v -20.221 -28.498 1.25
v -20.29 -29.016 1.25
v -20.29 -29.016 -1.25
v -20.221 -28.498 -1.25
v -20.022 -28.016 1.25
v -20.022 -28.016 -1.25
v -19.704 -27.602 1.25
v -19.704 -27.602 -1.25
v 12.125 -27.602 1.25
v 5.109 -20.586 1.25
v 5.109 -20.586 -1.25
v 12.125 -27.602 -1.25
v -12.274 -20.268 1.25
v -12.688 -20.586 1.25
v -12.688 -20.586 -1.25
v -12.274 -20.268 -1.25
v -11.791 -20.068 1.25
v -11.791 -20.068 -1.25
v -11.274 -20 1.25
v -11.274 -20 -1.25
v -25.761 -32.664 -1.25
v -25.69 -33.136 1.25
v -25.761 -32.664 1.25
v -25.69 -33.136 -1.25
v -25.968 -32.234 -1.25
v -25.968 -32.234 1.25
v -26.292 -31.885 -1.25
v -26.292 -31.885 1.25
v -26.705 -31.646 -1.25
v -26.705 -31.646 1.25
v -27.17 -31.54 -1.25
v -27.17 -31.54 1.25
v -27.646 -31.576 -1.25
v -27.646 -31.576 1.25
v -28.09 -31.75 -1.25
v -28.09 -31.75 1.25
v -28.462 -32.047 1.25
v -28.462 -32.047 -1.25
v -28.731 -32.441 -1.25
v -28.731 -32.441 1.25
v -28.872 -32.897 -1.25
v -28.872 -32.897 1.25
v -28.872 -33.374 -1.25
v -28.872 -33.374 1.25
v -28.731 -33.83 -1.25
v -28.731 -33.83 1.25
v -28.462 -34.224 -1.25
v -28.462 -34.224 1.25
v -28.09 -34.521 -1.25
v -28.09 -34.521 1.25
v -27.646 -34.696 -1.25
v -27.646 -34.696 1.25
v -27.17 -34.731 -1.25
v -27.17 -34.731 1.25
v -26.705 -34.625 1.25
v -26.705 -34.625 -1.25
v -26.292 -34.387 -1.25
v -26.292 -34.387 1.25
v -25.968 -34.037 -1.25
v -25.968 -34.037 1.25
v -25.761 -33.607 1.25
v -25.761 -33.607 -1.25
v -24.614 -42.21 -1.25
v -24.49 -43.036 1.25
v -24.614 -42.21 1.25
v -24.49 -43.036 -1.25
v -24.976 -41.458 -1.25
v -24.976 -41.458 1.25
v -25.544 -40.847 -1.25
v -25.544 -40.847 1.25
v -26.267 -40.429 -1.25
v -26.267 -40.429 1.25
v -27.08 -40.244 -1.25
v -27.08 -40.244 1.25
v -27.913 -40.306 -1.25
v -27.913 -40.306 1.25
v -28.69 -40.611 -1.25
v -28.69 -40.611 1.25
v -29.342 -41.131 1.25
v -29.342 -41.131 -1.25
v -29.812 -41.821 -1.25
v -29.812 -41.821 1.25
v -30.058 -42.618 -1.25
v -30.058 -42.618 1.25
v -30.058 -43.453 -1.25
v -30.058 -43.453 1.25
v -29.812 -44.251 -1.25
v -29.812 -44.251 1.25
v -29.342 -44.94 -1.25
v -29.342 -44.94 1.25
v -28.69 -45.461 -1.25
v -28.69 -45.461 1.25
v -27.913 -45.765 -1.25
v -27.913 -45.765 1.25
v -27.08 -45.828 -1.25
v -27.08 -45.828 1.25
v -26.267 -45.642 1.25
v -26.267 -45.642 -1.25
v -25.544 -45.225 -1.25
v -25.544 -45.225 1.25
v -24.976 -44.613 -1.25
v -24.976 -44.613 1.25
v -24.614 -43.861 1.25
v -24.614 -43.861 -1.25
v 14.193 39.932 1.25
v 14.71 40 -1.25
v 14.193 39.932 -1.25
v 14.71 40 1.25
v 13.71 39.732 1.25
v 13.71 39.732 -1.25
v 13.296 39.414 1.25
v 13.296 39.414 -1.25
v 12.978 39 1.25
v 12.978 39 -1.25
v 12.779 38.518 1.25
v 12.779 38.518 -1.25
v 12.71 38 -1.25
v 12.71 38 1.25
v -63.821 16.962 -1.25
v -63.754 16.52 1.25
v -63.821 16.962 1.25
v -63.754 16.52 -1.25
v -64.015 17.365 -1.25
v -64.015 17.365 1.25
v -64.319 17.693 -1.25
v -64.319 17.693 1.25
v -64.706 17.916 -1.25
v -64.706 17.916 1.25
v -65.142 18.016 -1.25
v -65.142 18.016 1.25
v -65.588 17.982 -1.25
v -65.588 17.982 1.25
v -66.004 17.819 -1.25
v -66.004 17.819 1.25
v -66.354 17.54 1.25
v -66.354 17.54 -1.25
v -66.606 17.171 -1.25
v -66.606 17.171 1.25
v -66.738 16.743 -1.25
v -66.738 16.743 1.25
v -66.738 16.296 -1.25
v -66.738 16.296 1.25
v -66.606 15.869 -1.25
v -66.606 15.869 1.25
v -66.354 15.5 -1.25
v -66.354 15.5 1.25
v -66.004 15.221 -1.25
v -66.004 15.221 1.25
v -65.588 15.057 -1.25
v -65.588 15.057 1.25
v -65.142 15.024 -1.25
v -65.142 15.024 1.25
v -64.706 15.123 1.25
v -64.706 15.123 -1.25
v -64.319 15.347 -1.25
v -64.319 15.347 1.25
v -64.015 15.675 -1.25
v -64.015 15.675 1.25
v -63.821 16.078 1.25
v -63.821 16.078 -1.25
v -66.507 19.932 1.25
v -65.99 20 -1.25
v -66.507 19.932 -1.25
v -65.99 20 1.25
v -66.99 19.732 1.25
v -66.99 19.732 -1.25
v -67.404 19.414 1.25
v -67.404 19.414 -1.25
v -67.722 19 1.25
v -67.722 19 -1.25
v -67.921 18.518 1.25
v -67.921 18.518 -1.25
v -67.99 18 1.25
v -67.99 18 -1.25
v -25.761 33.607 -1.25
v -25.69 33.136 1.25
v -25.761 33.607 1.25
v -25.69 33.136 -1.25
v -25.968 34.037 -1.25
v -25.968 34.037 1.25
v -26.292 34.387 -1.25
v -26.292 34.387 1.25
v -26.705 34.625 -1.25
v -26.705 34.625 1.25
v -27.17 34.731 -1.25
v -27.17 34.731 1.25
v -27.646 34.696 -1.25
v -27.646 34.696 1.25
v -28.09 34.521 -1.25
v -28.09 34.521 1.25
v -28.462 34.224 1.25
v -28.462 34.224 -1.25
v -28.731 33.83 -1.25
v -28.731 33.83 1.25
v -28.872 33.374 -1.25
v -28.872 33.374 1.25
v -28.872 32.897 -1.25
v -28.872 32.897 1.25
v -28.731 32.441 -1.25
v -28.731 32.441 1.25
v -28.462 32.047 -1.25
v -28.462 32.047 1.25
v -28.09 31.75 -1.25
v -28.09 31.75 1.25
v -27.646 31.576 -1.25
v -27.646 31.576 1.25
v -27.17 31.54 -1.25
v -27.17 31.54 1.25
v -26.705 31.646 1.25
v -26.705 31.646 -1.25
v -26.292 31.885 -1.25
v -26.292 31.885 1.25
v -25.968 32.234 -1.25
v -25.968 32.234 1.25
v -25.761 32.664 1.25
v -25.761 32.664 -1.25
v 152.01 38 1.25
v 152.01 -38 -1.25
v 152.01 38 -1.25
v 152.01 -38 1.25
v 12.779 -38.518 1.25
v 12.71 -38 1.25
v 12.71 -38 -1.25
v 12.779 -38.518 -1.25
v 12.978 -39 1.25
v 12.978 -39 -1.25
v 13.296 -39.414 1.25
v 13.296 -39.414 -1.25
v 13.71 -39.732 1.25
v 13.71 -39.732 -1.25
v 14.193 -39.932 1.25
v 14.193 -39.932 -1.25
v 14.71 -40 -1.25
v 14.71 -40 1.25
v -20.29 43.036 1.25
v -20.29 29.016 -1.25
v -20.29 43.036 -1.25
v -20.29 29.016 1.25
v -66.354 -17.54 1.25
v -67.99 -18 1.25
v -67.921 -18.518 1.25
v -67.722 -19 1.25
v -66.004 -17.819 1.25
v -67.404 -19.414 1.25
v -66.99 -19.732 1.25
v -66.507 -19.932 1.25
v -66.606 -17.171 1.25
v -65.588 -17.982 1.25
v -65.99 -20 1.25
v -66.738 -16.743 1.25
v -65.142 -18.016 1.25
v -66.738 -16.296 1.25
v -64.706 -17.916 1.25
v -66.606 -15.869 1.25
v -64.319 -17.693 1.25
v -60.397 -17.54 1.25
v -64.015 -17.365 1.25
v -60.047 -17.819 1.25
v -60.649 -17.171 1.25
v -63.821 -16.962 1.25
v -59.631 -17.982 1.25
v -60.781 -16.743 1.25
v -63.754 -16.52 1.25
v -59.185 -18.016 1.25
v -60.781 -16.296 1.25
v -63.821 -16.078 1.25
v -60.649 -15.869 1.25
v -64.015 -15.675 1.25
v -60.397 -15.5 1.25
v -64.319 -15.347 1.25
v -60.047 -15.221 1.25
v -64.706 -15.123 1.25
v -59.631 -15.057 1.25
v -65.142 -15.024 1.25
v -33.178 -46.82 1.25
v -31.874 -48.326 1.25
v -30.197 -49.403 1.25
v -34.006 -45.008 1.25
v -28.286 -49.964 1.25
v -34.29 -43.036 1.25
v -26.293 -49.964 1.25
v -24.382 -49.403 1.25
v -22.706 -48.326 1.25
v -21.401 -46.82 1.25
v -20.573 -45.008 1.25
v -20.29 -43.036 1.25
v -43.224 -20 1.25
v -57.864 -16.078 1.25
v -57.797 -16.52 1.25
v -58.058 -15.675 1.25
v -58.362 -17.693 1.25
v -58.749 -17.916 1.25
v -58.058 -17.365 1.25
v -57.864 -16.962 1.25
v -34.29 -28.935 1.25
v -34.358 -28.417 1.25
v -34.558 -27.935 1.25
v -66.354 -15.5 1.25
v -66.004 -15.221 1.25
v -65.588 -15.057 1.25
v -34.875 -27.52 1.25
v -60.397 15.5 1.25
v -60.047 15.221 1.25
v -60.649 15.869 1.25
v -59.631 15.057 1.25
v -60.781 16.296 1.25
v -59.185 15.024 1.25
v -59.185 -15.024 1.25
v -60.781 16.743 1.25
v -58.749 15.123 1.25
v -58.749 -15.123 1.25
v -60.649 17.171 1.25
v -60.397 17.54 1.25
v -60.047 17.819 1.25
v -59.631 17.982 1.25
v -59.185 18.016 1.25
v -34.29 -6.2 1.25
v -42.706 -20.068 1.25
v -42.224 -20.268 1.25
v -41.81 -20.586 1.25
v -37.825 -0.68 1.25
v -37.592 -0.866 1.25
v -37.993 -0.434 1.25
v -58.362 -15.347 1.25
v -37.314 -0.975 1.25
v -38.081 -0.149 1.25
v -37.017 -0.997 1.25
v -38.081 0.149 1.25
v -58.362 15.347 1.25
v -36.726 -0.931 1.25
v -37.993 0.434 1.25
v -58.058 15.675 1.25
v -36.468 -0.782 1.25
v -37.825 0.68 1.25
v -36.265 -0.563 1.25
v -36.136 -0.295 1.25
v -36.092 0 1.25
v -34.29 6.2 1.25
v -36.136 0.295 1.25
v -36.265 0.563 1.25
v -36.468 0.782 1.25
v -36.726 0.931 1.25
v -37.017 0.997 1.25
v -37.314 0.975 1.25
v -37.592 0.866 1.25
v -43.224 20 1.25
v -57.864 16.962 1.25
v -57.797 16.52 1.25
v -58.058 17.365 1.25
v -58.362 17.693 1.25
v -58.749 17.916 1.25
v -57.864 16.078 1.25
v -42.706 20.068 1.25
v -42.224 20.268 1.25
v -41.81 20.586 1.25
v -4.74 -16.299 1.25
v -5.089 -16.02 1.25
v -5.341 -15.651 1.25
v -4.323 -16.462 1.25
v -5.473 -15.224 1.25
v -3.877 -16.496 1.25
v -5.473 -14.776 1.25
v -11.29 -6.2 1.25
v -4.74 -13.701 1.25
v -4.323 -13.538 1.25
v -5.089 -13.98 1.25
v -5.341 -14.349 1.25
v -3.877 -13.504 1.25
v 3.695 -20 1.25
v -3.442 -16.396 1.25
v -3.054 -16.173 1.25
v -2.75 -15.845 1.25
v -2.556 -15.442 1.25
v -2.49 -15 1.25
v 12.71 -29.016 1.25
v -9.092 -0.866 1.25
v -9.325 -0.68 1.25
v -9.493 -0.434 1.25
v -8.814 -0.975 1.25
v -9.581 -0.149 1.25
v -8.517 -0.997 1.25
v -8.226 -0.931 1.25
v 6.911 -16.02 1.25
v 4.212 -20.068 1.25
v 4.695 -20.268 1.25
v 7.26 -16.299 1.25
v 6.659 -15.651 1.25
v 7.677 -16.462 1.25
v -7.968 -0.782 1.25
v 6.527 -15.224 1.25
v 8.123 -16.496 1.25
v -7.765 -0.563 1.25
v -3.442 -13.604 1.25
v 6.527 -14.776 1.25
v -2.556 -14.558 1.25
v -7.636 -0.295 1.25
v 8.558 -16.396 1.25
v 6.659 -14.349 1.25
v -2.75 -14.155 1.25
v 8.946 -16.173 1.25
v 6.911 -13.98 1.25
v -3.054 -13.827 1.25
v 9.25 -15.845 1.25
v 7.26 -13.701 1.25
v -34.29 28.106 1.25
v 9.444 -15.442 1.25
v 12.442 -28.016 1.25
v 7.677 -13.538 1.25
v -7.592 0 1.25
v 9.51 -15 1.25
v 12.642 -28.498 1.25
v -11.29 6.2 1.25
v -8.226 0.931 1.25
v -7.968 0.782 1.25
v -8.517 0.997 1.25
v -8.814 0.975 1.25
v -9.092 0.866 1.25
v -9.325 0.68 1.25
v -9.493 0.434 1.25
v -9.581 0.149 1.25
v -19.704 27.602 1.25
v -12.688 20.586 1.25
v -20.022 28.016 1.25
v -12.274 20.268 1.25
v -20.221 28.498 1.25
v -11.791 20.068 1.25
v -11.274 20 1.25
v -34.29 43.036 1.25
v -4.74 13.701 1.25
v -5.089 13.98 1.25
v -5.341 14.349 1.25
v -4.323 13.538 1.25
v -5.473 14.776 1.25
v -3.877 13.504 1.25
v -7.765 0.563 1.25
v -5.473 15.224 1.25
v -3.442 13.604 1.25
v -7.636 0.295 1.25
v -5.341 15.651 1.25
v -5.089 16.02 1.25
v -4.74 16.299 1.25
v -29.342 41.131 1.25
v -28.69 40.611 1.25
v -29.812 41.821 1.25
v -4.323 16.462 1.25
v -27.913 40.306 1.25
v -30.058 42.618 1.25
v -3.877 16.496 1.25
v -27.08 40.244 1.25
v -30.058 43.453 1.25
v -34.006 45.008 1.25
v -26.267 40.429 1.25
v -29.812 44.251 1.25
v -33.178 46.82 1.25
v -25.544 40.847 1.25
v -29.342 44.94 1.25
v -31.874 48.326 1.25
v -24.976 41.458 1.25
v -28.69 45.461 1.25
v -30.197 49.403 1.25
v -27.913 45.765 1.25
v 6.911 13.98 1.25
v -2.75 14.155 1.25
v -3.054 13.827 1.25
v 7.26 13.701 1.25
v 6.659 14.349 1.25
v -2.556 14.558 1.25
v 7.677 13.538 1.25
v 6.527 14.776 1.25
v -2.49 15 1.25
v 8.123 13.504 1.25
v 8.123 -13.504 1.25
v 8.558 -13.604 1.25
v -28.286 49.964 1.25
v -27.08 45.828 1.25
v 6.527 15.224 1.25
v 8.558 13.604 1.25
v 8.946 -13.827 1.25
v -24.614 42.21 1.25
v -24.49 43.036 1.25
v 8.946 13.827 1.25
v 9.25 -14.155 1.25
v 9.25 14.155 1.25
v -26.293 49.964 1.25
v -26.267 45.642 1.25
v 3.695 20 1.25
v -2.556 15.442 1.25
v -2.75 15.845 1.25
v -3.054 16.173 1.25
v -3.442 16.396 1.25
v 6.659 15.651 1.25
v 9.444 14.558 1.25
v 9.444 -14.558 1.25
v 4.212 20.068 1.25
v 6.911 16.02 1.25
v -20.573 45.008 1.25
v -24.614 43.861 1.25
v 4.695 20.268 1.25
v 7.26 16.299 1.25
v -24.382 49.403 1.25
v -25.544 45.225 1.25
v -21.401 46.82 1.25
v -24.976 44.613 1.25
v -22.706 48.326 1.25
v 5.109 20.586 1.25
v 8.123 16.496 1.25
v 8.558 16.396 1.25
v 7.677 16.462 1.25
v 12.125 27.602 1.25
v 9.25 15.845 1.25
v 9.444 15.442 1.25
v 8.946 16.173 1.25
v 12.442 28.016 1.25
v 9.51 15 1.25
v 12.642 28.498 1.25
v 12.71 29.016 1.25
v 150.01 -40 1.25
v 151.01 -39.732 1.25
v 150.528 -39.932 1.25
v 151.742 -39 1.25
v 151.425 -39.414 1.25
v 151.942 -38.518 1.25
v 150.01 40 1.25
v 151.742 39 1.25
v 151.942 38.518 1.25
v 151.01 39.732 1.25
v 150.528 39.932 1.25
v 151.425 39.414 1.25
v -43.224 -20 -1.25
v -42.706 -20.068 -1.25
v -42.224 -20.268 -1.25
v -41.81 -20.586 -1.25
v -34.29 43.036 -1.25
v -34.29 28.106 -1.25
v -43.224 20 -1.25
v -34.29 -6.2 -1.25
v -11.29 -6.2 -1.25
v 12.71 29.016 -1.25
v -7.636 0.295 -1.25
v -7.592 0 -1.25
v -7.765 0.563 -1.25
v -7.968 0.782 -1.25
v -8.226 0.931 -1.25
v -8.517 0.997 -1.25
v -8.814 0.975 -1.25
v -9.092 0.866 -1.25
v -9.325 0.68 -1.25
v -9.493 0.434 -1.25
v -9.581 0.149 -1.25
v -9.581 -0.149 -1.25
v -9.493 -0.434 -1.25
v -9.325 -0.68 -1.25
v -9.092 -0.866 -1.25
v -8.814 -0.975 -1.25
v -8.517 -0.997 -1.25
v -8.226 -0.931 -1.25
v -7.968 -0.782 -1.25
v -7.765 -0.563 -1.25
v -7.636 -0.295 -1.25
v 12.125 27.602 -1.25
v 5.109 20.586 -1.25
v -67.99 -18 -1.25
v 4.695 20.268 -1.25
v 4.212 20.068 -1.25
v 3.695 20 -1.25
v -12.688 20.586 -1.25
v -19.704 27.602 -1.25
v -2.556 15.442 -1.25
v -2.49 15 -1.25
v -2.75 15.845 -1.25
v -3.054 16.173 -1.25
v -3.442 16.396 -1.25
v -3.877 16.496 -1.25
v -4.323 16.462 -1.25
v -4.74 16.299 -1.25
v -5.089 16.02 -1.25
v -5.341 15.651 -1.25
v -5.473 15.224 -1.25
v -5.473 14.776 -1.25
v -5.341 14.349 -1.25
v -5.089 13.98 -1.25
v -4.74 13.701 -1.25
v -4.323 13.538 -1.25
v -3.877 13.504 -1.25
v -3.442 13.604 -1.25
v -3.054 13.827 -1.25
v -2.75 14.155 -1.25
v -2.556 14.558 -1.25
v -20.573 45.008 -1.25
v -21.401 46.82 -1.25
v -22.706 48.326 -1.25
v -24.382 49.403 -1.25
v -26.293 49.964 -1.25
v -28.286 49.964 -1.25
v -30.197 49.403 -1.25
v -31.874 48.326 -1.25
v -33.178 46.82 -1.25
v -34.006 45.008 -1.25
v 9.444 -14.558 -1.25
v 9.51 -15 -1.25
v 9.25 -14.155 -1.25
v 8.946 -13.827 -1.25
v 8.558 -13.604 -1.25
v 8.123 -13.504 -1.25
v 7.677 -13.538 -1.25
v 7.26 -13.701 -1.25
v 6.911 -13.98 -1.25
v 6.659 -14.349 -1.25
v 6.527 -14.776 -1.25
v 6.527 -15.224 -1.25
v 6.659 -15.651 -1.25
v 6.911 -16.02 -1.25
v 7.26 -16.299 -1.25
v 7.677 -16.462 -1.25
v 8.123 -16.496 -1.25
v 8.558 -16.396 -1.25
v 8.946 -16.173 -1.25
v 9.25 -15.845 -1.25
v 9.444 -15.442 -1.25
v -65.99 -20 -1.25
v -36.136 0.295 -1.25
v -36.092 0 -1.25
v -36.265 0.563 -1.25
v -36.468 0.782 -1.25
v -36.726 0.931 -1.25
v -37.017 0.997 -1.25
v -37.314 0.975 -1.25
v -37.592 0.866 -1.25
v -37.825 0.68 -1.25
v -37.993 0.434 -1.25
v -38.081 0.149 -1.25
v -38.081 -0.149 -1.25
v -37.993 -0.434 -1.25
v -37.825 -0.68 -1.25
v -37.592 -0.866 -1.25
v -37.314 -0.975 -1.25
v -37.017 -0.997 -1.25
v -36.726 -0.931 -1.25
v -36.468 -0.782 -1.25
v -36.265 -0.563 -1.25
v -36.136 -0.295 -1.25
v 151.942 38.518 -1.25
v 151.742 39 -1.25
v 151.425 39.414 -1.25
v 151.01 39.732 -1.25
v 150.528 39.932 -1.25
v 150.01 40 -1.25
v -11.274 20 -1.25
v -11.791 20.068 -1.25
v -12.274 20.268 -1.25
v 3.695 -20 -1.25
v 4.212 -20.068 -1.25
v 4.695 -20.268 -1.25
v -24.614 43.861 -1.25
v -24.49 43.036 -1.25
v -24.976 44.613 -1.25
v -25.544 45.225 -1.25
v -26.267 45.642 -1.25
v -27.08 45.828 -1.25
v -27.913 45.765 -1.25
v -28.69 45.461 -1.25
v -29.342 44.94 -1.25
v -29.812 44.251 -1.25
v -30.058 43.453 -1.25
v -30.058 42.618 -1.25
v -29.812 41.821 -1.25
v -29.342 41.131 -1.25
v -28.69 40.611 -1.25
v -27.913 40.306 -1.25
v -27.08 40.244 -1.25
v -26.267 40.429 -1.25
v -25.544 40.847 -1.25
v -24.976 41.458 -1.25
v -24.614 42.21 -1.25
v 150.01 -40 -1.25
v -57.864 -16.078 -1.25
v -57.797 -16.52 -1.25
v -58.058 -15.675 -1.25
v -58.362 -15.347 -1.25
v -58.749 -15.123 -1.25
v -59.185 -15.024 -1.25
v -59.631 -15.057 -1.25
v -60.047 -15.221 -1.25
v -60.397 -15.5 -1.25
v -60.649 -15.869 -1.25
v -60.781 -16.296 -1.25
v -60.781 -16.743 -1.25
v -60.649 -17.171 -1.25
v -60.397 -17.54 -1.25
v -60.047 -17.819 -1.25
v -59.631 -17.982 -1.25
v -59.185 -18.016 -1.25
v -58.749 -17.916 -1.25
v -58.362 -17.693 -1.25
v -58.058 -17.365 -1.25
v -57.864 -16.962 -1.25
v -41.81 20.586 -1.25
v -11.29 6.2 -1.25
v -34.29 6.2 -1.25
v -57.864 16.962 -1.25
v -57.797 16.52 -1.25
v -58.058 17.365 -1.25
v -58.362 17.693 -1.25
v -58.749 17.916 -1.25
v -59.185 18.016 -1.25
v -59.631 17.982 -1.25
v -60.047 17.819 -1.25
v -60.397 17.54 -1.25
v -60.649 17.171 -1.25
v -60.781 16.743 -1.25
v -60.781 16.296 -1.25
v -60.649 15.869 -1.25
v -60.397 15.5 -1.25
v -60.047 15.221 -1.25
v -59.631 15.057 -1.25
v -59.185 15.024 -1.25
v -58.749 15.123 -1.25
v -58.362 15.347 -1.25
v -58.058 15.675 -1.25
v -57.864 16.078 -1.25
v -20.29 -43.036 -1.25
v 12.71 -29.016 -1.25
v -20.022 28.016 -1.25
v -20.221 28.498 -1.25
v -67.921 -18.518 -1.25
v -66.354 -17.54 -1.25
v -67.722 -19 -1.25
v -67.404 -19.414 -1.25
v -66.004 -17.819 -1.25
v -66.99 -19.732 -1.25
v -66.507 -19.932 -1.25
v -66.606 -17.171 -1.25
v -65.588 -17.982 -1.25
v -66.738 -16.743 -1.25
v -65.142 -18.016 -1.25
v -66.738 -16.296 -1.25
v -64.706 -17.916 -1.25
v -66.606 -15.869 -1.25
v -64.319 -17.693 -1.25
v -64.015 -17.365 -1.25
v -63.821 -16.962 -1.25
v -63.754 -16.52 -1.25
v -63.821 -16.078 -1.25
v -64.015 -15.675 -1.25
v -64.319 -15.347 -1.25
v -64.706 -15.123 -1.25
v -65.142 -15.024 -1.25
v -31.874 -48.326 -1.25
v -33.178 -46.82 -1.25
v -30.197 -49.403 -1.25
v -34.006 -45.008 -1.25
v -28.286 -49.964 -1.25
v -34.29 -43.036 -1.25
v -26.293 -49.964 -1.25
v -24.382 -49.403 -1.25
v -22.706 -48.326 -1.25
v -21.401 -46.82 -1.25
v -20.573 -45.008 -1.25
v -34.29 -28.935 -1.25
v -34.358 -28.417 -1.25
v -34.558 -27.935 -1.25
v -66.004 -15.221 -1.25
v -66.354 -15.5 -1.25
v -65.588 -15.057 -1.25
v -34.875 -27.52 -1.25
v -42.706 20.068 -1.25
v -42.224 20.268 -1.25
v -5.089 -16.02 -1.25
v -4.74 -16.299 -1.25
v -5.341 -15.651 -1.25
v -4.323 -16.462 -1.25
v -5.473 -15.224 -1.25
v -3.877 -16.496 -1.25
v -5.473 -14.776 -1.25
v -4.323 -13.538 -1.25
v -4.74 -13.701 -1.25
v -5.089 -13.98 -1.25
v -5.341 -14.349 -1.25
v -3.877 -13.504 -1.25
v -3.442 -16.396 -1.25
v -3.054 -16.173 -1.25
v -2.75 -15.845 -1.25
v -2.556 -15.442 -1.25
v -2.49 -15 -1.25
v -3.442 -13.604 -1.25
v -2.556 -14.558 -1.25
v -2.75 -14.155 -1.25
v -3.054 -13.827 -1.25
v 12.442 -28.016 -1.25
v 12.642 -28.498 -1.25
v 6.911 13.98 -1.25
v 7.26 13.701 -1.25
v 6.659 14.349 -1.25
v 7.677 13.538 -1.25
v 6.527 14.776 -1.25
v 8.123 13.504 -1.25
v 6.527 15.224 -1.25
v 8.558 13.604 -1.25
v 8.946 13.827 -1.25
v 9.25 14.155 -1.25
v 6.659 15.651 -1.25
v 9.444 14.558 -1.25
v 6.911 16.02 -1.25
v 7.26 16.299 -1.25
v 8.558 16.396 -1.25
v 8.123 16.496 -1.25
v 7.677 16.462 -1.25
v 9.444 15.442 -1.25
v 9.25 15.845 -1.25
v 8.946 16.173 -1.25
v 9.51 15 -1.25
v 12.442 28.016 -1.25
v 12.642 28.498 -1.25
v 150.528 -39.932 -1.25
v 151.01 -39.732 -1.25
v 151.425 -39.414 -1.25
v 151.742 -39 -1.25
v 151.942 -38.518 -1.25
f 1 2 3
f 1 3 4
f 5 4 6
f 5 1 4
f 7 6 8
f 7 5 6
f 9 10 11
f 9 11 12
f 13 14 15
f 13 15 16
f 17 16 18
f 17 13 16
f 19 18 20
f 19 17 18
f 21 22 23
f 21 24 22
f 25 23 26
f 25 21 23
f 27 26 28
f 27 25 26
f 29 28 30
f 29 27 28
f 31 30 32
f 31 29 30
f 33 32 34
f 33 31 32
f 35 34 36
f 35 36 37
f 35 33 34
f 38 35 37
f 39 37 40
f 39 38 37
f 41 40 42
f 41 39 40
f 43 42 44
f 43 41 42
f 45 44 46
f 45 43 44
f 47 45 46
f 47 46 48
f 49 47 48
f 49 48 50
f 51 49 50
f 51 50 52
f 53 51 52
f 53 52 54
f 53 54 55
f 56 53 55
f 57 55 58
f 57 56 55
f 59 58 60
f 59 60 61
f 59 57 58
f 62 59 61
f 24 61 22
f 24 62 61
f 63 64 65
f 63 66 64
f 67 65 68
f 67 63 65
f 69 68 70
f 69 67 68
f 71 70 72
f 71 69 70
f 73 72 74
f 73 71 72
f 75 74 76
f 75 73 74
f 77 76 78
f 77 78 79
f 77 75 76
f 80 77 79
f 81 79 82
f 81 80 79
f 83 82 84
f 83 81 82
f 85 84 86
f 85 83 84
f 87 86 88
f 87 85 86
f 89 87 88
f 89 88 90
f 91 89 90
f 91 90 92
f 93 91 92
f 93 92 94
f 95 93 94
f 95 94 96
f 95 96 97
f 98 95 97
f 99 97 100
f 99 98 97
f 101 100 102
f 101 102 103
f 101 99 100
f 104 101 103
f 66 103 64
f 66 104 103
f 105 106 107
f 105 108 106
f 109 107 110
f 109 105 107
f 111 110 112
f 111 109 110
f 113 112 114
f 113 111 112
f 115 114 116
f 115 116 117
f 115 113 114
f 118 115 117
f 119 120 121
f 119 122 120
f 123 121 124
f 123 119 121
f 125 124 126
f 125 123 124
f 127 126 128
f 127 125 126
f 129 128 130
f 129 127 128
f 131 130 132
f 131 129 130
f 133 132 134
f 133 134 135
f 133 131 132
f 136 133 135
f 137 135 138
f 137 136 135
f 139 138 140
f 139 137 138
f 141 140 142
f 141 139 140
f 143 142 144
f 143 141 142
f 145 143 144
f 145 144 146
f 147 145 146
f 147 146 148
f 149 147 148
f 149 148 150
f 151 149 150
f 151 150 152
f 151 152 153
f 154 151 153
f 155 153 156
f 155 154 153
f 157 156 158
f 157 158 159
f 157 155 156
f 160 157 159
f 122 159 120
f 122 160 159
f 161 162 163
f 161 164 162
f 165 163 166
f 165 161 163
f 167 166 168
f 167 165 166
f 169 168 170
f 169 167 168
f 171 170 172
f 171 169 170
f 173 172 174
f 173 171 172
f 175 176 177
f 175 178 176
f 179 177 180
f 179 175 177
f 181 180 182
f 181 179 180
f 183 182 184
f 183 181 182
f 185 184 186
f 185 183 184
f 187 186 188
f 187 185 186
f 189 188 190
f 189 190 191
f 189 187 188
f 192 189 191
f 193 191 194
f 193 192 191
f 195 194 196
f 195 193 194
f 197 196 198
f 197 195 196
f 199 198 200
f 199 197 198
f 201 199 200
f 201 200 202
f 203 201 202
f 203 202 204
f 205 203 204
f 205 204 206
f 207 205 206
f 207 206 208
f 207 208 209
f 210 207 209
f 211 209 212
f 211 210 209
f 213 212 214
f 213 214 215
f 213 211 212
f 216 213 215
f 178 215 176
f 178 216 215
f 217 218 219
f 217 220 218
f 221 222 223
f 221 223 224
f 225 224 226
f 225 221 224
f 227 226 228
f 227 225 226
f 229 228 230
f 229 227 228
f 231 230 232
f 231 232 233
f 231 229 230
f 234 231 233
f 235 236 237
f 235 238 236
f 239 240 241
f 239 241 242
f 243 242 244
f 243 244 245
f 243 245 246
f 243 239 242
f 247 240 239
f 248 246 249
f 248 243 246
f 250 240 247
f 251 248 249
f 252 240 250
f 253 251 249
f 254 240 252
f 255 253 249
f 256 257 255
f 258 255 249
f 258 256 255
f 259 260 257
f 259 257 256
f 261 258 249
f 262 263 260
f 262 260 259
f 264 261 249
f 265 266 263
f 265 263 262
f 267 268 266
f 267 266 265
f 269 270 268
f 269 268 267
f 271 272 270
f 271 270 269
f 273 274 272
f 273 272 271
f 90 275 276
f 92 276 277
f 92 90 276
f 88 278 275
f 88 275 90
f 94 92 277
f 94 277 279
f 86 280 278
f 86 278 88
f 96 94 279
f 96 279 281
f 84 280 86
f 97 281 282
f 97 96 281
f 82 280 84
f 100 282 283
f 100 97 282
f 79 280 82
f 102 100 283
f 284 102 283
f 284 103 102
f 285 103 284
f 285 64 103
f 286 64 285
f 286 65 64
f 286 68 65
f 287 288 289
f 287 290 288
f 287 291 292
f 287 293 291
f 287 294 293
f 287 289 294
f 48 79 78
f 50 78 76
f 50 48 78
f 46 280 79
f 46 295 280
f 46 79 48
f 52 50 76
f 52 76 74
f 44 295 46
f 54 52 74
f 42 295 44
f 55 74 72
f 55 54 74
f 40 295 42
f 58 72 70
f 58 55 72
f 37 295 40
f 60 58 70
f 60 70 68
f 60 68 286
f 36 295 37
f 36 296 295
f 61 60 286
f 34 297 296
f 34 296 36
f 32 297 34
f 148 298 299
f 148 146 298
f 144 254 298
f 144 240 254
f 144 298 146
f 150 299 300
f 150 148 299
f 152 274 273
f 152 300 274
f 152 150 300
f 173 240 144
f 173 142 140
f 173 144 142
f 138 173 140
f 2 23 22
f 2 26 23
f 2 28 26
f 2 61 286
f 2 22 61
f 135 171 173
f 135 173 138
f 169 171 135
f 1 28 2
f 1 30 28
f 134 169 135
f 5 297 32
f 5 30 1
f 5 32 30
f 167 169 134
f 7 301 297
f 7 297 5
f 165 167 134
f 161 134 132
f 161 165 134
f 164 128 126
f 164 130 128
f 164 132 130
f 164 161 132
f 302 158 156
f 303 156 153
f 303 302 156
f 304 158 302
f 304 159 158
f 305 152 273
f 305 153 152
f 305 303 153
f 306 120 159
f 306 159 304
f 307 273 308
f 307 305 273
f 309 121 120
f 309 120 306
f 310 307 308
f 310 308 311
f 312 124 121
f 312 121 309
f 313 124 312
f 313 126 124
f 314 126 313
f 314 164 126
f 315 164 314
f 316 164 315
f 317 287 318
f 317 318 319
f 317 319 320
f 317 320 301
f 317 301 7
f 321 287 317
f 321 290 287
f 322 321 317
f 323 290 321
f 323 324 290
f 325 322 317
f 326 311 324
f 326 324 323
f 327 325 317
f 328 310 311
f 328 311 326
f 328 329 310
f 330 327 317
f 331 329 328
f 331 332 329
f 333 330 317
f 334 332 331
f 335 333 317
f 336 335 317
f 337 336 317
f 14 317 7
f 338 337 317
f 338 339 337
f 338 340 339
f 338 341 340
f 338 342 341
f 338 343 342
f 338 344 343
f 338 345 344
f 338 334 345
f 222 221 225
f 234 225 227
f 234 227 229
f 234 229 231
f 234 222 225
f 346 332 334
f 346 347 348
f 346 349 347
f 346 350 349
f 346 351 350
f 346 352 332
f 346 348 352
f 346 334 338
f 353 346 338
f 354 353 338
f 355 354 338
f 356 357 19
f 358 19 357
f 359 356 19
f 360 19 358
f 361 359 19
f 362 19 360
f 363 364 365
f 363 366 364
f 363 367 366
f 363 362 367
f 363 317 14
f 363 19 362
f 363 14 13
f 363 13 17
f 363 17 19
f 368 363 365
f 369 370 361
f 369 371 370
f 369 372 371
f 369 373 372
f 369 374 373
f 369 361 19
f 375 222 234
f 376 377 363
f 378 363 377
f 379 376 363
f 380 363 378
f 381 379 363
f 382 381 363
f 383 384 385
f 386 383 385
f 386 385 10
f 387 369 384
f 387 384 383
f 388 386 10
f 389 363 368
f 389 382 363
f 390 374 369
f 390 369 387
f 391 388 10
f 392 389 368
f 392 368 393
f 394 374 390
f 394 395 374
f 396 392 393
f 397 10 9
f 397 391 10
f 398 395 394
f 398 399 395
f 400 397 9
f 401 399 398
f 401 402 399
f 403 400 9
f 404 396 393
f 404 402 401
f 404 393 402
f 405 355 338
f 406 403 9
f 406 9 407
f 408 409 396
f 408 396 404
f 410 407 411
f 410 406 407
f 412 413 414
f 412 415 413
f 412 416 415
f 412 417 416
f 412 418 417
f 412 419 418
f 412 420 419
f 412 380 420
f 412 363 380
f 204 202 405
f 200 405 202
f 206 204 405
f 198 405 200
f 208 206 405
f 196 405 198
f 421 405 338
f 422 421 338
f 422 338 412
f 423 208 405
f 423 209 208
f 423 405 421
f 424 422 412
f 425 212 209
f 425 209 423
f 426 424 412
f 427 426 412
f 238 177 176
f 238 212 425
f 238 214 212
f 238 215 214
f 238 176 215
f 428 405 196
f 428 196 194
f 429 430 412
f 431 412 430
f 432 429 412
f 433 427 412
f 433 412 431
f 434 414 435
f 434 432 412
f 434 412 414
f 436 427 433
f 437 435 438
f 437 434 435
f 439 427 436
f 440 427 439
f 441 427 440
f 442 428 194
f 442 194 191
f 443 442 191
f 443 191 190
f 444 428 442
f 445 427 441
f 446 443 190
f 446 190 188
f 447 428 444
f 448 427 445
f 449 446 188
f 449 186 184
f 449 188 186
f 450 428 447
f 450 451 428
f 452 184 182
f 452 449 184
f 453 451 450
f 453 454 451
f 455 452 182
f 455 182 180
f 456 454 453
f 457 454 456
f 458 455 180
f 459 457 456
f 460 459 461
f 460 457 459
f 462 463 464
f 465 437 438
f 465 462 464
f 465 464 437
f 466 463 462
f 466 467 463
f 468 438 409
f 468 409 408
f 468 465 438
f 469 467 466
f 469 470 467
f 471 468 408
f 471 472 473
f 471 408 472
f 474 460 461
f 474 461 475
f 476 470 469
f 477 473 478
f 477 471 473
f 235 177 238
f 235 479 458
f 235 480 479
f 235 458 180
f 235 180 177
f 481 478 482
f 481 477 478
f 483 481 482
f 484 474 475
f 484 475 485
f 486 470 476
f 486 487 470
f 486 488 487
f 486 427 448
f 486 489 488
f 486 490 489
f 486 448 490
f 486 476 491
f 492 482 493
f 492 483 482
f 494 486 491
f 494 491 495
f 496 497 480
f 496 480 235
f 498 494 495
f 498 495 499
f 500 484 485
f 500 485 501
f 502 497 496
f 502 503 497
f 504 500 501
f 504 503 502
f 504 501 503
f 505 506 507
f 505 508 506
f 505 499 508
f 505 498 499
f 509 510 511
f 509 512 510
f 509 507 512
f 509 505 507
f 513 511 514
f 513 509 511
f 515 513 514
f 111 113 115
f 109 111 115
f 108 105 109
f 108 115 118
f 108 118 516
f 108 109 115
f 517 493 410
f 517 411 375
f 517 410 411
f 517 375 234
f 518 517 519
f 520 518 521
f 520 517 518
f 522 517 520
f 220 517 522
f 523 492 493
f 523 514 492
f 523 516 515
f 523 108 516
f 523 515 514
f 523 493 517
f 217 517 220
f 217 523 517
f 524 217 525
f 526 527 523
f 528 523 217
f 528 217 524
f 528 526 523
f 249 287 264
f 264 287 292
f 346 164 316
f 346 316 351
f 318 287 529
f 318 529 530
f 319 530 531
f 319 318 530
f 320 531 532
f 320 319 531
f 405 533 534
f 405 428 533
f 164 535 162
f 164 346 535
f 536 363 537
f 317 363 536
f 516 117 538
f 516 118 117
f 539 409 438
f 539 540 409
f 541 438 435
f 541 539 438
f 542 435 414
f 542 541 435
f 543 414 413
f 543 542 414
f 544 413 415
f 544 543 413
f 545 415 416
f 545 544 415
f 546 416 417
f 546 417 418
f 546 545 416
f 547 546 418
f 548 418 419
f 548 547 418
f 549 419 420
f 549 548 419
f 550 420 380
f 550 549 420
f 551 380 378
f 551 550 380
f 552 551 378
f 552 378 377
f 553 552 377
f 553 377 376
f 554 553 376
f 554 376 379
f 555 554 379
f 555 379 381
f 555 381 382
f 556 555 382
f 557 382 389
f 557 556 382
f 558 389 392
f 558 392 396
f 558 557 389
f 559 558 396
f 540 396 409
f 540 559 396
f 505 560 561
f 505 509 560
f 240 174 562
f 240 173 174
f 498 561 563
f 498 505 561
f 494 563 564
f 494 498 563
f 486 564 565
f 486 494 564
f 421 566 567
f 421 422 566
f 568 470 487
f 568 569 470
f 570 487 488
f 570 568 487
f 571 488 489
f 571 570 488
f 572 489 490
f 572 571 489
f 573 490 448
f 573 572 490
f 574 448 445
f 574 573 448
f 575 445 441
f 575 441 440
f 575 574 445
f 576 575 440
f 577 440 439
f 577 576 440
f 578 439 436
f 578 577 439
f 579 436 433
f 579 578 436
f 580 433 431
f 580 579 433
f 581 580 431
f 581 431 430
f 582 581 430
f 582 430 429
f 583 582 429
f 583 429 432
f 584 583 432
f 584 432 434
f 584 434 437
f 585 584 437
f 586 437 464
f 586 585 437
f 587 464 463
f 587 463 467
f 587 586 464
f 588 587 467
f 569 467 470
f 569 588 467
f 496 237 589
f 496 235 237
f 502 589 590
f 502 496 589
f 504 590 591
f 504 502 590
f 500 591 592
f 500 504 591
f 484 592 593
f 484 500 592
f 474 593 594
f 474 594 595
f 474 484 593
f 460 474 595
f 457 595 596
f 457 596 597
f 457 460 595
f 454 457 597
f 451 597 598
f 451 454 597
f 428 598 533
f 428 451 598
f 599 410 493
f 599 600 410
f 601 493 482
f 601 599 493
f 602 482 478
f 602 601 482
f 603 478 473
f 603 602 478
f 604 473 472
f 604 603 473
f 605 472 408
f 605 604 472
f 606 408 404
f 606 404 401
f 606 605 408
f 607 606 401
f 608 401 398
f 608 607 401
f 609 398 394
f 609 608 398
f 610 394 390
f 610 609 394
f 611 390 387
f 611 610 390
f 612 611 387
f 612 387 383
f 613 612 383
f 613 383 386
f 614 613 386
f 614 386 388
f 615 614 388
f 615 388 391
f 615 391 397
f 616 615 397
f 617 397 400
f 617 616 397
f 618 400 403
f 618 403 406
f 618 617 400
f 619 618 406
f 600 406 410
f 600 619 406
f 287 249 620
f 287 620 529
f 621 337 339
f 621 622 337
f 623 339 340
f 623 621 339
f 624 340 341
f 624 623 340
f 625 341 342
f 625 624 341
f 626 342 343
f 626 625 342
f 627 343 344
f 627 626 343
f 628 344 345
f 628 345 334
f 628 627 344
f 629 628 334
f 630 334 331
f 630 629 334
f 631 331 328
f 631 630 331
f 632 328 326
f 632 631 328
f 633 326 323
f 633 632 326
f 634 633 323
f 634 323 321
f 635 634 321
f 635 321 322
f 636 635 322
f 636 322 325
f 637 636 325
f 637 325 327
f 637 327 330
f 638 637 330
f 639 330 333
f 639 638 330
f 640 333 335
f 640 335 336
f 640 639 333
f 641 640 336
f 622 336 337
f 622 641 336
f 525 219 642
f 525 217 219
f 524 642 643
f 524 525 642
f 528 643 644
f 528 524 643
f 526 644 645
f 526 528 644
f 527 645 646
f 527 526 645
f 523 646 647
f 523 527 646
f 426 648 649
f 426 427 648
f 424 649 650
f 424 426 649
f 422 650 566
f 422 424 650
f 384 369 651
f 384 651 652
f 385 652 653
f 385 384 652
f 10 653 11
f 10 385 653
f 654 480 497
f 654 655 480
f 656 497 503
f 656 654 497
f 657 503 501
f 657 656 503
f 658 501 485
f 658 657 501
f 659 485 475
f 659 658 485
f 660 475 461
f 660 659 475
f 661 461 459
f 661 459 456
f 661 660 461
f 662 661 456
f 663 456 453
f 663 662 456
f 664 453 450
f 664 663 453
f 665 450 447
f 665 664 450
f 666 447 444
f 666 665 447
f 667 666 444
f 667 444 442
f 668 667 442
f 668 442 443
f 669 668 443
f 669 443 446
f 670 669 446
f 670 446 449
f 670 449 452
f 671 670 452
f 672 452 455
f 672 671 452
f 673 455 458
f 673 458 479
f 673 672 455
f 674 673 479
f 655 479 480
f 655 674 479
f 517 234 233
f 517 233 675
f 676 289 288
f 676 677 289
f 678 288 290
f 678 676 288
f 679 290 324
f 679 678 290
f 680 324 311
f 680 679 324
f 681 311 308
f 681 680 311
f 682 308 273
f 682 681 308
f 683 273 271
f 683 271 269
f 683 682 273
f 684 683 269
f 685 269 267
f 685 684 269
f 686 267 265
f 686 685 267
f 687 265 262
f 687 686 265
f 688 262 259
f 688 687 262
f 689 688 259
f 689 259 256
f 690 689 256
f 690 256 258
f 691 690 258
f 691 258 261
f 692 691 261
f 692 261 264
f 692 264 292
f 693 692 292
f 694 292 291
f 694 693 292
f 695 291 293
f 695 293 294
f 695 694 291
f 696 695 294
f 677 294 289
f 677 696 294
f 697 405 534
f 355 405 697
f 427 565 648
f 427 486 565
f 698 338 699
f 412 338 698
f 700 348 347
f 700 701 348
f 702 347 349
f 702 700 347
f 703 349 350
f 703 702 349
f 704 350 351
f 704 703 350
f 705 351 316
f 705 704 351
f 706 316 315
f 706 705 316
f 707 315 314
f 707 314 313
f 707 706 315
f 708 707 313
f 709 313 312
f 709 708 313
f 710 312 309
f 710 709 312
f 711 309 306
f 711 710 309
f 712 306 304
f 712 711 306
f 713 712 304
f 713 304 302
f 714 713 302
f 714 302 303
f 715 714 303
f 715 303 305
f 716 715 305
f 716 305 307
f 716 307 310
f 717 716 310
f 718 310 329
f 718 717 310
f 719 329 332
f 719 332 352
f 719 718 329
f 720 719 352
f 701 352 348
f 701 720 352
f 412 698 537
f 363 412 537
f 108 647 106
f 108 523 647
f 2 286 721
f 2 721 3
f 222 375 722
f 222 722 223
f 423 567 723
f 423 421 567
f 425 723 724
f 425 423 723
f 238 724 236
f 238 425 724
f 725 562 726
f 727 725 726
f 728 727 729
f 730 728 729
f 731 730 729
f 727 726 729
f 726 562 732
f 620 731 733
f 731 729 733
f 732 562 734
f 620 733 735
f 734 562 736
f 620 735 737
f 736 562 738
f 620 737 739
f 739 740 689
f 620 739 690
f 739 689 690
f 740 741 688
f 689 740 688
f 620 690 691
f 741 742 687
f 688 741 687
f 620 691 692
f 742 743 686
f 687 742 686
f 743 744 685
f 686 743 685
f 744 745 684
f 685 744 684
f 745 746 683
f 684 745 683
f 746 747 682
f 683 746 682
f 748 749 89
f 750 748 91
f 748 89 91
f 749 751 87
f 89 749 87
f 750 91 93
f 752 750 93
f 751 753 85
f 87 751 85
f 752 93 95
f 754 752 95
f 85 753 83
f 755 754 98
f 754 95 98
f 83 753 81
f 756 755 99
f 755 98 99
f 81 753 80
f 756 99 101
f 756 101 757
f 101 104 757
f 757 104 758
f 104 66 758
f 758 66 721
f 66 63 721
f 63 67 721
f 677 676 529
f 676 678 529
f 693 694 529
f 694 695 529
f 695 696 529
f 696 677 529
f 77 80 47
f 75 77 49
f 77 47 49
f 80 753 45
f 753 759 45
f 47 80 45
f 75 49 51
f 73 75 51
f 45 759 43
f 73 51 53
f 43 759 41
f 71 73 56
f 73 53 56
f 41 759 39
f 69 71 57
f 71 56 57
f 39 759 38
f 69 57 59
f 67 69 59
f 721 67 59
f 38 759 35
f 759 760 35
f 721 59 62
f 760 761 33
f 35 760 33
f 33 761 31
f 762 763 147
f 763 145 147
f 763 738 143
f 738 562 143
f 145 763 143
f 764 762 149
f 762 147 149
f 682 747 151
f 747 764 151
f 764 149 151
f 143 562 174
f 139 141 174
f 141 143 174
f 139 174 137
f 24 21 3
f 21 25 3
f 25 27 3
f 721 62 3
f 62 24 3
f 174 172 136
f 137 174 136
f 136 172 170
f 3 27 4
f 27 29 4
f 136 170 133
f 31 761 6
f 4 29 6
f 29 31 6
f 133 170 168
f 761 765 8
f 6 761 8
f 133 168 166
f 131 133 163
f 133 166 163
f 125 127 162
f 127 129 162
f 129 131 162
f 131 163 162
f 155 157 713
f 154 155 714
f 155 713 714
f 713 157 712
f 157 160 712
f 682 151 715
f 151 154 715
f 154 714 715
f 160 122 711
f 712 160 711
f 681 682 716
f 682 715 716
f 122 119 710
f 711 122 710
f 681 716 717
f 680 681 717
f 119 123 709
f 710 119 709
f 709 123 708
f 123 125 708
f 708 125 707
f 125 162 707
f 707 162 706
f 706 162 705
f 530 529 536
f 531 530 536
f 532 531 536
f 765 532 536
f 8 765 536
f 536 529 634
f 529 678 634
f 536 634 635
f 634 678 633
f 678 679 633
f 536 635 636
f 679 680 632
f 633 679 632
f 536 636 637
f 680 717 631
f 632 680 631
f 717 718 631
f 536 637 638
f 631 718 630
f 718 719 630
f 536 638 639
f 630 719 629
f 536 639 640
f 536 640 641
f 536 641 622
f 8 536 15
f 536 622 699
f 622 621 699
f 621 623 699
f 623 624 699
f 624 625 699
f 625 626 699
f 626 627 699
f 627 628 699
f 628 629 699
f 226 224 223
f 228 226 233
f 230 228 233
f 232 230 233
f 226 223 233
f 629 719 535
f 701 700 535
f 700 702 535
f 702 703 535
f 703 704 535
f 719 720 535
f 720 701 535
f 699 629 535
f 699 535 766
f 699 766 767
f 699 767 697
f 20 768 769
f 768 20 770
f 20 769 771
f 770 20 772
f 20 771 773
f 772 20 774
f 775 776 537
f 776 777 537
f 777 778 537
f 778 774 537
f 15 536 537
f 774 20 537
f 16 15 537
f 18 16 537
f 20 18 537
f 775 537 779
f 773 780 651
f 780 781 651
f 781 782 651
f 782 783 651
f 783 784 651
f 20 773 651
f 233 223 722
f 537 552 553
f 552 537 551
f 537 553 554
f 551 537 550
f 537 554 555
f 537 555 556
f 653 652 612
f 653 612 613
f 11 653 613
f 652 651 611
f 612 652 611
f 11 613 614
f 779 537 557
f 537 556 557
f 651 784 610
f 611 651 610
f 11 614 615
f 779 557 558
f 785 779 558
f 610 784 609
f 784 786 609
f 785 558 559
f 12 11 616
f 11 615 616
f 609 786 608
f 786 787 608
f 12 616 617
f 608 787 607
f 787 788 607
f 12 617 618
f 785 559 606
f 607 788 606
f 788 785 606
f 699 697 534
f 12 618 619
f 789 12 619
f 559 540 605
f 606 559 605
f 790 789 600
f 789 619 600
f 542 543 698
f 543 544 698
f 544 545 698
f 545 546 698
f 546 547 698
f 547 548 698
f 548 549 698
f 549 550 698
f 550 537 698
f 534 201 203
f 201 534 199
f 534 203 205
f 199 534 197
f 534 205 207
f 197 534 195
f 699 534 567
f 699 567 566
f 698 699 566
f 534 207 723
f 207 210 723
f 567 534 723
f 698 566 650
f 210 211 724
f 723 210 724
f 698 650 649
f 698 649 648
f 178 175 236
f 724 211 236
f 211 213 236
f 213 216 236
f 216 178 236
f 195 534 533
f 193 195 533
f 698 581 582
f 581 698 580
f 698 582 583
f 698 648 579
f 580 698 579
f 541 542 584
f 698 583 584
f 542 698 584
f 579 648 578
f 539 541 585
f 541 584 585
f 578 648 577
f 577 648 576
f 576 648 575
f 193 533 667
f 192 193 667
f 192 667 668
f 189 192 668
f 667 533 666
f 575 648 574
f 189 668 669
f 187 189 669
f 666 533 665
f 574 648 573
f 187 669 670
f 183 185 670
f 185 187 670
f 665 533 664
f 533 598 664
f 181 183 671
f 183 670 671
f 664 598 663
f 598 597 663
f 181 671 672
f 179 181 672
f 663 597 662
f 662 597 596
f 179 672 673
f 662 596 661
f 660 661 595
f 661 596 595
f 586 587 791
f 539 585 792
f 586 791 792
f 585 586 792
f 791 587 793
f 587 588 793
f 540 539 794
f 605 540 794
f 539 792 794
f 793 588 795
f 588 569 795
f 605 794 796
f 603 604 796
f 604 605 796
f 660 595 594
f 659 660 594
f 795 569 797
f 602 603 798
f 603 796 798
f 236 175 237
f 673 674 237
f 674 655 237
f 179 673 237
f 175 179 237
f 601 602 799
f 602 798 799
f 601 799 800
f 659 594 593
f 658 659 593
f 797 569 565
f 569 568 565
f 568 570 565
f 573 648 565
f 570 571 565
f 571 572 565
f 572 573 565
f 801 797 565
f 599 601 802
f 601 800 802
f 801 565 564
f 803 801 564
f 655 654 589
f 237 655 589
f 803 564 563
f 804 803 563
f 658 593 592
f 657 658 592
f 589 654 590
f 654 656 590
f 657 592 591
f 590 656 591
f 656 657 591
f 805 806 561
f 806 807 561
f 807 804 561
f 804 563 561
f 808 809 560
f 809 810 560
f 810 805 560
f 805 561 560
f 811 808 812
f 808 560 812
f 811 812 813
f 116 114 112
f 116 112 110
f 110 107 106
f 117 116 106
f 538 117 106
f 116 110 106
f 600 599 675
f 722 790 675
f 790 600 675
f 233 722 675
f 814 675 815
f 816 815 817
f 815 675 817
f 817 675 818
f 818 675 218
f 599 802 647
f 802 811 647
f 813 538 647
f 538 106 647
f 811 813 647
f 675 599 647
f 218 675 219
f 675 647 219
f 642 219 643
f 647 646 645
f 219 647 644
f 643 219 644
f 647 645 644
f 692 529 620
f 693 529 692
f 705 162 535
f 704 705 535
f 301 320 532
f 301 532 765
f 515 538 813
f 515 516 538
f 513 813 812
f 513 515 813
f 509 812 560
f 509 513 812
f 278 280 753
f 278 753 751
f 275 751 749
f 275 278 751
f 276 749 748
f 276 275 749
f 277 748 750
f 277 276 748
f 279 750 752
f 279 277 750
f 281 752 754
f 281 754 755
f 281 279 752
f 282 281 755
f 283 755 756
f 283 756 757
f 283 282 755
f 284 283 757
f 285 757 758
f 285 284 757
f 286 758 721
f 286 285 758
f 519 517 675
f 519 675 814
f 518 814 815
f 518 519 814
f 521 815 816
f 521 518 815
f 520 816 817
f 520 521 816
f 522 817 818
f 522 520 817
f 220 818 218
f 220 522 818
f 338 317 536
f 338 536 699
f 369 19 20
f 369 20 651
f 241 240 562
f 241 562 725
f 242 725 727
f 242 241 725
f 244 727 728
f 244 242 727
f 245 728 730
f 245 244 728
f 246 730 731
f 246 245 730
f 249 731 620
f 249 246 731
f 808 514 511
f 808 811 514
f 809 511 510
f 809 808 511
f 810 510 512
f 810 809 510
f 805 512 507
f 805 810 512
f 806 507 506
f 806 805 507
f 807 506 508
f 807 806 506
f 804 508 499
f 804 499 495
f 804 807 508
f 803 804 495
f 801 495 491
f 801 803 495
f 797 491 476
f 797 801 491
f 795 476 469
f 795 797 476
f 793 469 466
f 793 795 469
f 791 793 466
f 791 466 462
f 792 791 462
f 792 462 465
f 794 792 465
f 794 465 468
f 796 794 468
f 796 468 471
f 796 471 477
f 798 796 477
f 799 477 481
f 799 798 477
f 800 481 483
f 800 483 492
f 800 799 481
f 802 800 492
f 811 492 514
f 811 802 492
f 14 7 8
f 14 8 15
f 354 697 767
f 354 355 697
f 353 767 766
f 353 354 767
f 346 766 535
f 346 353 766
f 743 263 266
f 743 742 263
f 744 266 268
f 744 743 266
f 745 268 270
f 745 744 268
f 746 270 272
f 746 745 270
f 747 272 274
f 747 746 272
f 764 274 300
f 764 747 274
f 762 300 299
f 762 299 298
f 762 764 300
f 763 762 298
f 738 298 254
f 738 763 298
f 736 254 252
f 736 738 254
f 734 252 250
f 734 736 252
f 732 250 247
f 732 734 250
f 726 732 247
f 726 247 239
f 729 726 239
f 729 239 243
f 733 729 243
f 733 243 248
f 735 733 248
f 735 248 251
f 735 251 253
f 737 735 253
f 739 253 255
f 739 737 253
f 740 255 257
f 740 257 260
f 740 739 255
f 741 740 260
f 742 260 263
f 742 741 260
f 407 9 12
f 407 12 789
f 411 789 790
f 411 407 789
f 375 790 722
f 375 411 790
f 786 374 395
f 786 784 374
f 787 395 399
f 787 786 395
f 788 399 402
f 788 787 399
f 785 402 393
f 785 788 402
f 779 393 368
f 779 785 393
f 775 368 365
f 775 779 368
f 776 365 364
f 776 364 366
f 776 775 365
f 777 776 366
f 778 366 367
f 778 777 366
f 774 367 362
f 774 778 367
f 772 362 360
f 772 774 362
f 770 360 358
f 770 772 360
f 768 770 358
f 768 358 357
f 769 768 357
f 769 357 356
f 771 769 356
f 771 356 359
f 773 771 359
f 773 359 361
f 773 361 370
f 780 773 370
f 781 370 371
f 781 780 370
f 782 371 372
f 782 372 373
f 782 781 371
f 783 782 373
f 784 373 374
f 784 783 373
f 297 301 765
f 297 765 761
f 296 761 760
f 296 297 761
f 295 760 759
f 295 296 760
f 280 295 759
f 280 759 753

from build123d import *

# Parameters (mm, degrees)
F0_R     = 2.8
F0_R_2   = 1.6
F0_R_3   = 1.5
F0_R_4   = 1
F1_DEPTH = 1.25


with BuildPart() as f1:
    # F0 (on Top) → F1 (new body, symmetric)
    with BuildSketch(Plane.XY):
        with BuildLine():
            Line((-67.989561, 18), (-67.989561, 0))
            Line((-67.989561, 0), (-67.989561, -18))
            ThreePointArc((-67.989561, -18), (-67.403774, -19.414214), (-65.989561, -20))
            Line((-65.989561, -20), (-43.224092, -20))
            ThreePointArc((-43.224092, -20), (-42.458725, -20.152241), (-41.809879, -20.585786))
            Line((-41.809879, -20.585786), (-34.875347, -27.520318))
            ThreePointArc((-34.875347, -27.520318), (-34.441802, -28.169165), (-34.289561, -28.934531))
            Line((-34.289561, -28.934531), (-34.289561, -43.035682))
            ThreePointArc((-34.289561, -43.035682), (-27.289561, -50.035682), (-20.289561, -43.035682))
            Line((-20.289561, -43.035682), (-20.289561, -29.015935))
            ThreePointArc((-20.289561, -29.015935), (-20.13732, -28.250568), (-19.703774, -27.601721))
            Line((-19.703774, -27.601721), (-12.687839, -20.585786))
            ThreePointArc((-12.687839, -20.585786), (-12.038993, -20.152241), (-11.273626, -20))
            Line((-11.273626, -20), (3.694504, -20))
            ThreePointArc((3.694504, -20), (4.459871, -20.152241), (5.108718, -20.585786))
            Line((5.108718, -20.585786), (12.124653, -27.601721))
            ThreePointArc((12.124653, -27.601721), (12.558198, -28.250568), (12.710439, -29.015935))
            Line((12.710439, -29.015935), (12.710439, -38))
            ThreePointArc((12.710439, -38), (13.296226, -39.414214), (14.710439, -40))
            Line((14.710439, -40), (150.010439, -40))
            ThreePointArc((150.010439, -40), (151.424653, -39.414214), (152.010439, -38))
            Line((152.010439, -38), (152.010439, 0))
            Line((152.010439, 0), (152.010439, 38))
            ThreePointArc((152.010439, 38), (151.424653, 39.414214), (150.010439, 40))
            Line((150.010439, 40), (14.710439, 40))
            ThreePointArc((14.710439, 40), (13.296226, 39.414214), (12.710439, 38))
            Line((12.710439, 38), (12.710439, 29.015935))
            ThreePointArc((12.710439, 29.015935), (12.558198, 28.250568), (12.124653, 27.601721))
            Line((12.124653, 27.601721), (5.108718, 20.585786))
            ThreePointArc((5.108718, 20.585786), (4.459871, 20.152241), (3.694504, 20))
            Line((3.694504, 20), (-11.273626, 20))
            ThreePointArc((-11.273626, 20), (-12.038993, 20.152241), (-12.687839, 20.585786))
            Line((-12.687839, 20.585786), (-19.703774, 27.601721))
            ThreePointArc((-19.703774, 27.601721), (-20.13732, 28.250568), (-20.289561, 29.015935))
            Line((-20.289561, 29.015935), (-20.289561, 43.035682))
            ThreePointArc((-20.289561, 43.035682), (-27.289561, 50.035682), (-34.289561, 43.035682))
            Line((-34.289561, 43.035682), (-34.289561, 28.106104))
            Line((-34.289561, 28.106104), (-41.809879, 20.585786))
            ThreePointArc((-41.809879, 20.585786), (-42.458725, 20.152241), (-43.224092, 20))
            Line((-43.224092, 20), (-65.989561, 20))
            ThreePointArc((-65.989561, 20), (-67.403774, 19.414214), (-67.989561, 18))
        make_face()
        with Locations((-27.289561, -43.035682)):
            Circle(F0_R, mode=Mode.SUBTRACT)
        with Locations((-27.289561, -33.135682)):
            Circle(F0_R_2, mode=Mode.SUBTRACT)
        with Locations((-65.254413, -16.519763)):
            Circle(F0_R_3, mode=Mode.SUBTRACT)
        with Locations((-59.297452, -16.519763)):
            Circle(F0_R_3, mode=Mode.SUBTRACT)
        with Locations((-3.989561, -15)):
            Circle(F0_R_3, mode=Mode.SUBTRACT)
        with Locations((8.010439, -15)):
            Circle(F0_R_3, mode=Mode.SUBTRACT)
        with Locations((-37.09171, 0)):
            Circle(F0_R_4, mode=Mode.SUBTRACT)
        Polygon((-34.289561, 0), (-34.289561, 6.2), (-11.289561, 6.2), (-11.289561, 0), (-11.289561, -6.2), (-34.289561, -6.2), align=None, mode=Mode.SUBTRACT)
        with Locations((-65.254413, 16.519763)):
            Circle(F0_R_3, mode=Mode.SUBTRACT)
        with Locations((-59.297452, 16.519763)):
            Circle(F0_R_3, mode=Mode.SUBTRACT)
        with Locations((-8.59171, 0)):
            Circle(F0_R_4, mode=Mode.SUBTRACT)
        with Locations((-3.989561, 15)):
            Circle(F0_R_3, mode=Mode.SUBTRACT)
        with Locations((8.010439, 15)):
            Circle(F0_R_3, mode=Mode.SUBTRACT)
        with Locations((-27.289561, 33.135682)):
            Circle(F0_R_2, mode=Mode.SUBTRACT)
        with Locations((-27.289561, 43.035682)):
            Circle(F0_R, mode=Mode.SUBTRACT)
    extrude(amount=F1_DEPTH, both=True)


solid = f1.part
